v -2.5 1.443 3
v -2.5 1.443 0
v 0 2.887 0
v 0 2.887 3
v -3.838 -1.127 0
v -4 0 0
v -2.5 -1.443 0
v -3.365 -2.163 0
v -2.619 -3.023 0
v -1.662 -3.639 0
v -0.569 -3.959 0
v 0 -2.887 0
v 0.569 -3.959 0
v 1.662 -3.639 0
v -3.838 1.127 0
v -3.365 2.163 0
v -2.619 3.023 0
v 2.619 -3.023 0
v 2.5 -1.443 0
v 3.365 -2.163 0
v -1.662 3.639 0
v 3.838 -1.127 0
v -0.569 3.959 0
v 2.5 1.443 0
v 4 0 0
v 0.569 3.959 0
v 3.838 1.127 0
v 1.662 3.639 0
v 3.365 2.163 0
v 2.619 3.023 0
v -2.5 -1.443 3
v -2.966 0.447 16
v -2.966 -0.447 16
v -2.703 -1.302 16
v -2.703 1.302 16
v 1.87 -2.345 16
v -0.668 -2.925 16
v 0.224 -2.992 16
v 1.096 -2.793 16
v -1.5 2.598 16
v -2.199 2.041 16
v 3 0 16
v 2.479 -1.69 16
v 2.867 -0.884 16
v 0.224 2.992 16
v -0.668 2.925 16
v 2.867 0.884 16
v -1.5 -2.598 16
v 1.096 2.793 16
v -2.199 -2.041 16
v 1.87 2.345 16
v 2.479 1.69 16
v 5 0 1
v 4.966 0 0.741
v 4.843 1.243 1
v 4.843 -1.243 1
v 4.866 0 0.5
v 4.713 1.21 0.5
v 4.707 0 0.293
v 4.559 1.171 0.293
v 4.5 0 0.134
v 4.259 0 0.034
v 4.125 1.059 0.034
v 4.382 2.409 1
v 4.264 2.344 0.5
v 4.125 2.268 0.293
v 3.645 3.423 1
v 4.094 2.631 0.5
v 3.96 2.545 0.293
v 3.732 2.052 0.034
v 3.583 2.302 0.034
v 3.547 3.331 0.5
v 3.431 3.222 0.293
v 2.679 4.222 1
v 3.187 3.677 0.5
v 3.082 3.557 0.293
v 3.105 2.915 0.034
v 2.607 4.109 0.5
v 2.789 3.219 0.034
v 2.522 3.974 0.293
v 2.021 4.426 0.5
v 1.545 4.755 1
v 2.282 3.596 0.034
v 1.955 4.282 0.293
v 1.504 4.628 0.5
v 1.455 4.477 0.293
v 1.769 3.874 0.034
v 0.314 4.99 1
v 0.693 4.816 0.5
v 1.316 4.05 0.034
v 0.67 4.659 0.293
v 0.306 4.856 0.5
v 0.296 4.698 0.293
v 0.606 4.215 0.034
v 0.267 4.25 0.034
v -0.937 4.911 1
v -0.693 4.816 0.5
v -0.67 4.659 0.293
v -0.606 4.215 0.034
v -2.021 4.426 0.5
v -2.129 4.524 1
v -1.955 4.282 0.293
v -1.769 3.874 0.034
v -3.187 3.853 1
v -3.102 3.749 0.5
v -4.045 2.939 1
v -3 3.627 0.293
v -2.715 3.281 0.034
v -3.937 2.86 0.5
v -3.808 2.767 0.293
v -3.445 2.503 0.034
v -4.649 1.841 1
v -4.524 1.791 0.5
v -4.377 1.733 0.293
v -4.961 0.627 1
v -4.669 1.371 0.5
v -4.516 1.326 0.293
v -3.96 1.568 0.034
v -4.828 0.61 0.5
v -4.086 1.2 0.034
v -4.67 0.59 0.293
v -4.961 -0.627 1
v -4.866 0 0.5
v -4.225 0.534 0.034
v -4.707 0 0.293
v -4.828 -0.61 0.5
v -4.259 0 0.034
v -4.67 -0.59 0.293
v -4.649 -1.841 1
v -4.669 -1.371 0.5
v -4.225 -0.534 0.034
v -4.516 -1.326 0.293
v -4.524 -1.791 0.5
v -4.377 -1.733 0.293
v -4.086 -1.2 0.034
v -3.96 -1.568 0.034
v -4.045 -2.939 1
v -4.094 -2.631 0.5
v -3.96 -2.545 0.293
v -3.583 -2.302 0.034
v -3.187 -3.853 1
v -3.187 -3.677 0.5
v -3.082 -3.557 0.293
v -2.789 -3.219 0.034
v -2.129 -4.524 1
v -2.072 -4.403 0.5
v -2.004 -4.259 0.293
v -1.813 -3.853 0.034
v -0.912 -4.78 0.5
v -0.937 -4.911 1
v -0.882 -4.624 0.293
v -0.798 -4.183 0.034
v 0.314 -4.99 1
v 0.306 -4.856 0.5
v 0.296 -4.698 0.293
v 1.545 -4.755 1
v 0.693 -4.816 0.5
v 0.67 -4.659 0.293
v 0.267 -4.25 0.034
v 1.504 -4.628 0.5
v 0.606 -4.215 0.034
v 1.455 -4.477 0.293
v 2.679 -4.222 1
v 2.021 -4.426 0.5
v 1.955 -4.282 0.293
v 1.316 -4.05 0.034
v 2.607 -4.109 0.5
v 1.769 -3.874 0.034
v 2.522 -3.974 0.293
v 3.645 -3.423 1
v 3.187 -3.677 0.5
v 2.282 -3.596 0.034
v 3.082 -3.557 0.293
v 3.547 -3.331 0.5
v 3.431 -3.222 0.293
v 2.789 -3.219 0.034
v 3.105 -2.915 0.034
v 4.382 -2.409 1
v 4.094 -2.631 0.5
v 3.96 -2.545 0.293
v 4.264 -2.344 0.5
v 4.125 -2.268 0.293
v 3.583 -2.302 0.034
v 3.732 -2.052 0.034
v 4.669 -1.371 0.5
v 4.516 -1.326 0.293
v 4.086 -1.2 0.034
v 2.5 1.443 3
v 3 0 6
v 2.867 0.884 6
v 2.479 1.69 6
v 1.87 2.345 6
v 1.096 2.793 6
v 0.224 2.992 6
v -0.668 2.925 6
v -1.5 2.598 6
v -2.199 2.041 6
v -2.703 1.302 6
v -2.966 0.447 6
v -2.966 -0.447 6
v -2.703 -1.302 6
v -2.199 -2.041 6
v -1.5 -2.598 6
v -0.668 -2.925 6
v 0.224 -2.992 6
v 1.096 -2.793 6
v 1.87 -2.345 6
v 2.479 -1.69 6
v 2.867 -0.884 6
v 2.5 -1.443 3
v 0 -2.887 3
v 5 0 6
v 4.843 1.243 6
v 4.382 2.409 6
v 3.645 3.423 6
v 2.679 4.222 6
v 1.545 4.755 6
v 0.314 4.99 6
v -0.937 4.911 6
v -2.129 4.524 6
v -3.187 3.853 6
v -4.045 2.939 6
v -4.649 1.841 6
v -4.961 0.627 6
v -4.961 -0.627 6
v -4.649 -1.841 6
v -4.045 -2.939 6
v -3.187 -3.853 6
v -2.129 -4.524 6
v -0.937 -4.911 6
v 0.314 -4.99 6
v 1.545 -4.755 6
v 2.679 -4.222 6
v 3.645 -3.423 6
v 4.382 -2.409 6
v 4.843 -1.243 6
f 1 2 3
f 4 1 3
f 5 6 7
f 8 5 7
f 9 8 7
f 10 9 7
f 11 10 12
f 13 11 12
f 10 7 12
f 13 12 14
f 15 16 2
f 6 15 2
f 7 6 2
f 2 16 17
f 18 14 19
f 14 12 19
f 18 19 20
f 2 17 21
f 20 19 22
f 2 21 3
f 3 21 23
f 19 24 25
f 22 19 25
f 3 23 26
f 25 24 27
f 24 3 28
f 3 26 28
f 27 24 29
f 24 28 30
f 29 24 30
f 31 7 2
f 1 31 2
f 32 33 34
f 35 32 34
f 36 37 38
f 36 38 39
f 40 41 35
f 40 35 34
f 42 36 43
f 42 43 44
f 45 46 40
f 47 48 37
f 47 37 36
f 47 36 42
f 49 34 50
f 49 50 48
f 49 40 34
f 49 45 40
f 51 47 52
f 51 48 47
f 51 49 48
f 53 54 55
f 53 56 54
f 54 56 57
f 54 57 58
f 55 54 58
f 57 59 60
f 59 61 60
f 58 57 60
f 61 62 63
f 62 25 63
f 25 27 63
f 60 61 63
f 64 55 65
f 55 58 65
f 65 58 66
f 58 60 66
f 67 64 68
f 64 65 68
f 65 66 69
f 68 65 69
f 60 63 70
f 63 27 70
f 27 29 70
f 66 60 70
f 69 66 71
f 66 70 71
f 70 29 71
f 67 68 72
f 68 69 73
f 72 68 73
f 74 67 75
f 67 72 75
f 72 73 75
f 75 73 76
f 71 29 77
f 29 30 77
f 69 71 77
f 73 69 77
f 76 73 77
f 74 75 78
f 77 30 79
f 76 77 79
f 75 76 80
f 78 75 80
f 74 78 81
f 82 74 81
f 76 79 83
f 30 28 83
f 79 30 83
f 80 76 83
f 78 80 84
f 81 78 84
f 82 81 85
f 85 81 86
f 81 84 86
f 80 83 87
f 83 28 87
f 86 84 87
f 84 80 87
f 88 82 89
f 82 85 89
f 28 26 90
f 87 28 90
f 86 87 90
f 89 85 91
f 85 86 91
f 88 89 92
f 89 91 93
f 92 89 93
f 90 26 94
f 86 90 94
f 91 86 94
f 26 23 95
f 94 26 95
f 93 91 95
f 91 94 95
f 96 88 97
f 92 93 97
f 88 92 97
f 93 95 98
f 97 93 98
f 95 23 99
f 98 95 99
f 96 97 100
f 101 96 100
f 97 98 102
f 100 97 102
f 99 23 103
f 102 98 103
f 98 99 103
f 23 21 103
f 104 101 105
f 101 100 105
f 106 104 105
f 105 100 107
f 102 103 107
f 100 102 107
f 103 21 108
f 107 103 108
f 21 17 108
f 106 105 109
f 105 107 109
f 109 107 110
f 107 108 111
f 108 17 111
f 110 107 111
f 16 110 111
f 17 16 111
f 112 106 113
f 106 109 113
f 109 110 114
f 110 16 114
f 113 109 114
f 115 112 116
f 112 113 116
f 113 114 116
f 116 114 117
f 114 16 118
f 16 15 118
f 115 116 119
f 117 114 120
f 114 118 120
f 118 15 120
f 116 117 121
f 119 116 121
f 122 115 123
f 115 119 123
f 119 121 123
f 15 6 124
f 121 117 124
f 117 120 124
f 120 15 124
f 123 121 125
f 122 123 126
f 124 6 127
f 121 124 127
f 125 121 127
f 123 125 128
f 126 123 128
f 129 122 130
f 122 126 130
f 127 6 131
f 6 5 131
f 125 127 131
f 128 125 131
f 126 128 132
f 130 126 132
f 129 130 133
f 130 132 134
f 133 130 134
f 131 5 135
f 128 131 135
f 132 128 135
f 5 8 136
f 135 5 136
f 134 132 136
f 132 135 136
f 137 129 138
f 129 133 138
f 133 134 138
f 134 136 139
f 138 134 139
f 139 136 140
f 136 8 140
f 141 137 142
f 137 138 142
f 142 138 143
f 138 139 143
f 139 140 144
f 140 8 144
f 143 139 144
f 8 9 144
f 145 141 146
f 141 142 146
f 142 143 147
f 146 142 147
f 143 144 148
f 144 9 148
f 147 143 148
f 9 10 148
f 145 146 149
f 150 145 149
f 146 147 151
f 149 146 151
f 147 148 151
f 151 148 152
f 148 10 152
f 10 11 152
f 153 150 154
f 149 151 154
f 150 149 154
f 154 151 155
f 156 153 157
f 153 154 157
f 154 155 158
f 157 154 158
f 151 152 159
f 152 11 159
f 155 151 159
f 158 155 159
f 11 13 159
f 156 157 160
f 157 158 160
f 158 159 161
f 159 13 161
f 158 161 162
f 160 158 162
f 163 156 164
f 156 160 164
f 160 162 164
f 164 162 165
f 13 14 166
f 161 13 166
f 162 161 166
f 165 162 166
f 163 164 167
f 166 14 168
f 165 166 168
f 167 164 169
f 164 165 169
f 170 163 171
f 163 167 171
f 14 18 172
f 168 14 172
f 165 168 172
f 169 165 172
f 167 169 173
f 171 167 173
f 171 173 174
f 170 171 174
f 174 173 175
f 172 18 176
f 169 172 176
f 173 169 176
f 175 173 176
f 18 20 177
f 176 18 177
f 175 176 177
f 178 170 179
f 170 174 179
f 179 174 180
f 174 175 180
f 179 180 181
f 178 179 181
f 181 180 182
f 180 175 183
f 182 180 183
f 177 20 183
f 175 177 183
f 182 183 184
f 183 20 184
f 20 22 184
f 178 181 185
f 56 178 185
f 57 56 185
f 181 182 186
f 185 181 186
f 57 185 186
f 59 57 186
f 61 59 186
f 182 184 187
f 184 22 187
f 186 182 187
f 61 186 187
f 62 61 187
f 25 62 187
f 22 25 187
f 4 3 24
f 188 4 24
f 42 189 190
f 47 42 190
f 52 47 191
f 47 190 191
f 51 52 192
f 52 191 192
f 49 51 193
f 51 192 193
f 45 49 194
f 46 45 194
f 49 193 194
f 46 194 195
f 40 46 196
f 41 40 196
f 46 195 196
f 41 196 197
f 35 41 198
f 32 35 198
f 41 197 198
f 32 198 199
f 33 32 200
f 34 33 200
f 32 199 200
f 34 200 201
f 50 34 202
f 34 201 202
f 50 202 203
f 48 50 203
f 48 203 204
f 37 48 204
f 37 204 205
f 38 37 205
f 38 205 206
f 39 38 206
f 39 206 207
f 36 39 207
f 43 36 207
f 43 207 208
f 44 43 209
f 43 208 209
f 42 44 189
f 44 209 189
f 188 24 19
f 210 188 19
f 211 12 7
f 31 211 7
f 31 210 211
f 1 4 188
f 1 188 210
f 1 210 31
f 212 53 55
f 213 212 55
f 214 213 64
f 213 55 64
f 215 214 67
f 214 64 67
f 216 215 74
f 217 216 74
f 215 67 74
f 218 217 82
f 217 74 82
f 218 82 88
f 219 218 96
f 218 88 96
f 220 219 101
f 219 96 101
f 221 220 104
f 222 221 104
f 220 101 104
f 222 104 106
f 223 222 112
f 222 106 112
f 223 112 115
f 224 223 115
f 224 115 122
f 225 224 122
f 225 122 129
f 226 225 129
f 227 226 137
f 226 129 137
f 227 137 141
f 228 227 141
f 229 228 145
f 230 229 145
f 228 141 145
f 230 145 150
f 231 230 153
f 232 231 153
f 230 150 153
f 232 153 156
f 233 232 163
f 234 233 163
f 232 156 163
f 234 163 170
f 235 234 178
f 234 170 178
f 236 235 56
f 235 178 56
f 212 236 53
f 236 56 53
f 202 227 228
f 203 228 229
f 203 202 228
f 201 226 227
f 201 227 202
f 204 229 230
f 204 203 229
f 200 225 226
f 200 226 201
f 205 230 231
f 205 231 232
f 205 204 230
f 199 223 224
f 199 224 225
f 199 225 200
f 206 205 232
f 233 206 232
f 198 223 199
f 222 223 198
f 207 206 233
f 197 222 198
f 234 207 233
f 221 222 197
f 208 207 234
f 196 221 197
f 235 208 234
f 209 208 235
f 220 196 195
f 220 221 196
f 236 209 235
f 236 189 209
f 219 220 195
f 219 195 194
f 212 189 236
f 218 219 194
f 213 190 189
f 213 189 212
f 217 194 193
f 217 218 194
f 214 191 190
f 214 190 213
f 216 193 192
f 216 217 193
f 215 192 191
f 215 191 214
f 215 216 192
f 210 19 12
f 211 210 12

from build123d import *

# Parameters (mm, degrees)
SKETCH_1_R          = 5
EXTRUDE_1_DEPTH     = 6
SKETCH_2_R          = 3
EXTRUDE_2_DEPTH     = 10
CUT_EXTRUDE_1_DEPTH = 3
FILLET_1_R          = 1


with BuildPart() as part:
    # ｽｹｯﾁ1 → ﾎﾞｽ - 押し出し1 (new body)
    with BuildSketch(Plane.XY):
        Circle(SKETCH_1_R)
    extrude(amount=EXTRUDE_1_DEPTH)

    # ｽｹｯﾁ2 → ﾎﾞｽ - 押し出し2 (add)
    with BuildSketch(Plane.XY.offset(6)):
        Circle(SKETCH_2_R)
    extrude(amount=EXTRUDE_2_DEPTH)

    # ｽｹｯﾁ3 → ｶｯﾄ - 押し出し1 (cut)
    with BuildSketch(Plane(origin=(0, 0, 0), x_dir=(-1, 0, 0), z_dir=(0, 0, -1))):
        Polygon((-2.5, -1.443375673), (0, -2.886751346), (2.5, -1.443375673), (2.5, 1.443375673), (0, 2.886751346), (-2.5, 1.443375673), align=None)
    extrude(amount=-CUT_EXTRUDE_1_DEPTH, mode=Mode.SUBTRACT)

    # ﾌｨﾚｯﾄ1
    fillet_1_edges = [part.edges().sort_by_distance(p)[0] for p in [
        (-5, 0, 0),
    ]]
    fillet(fillet_1_edges, radius=FILLET_1_R)


solid = part.part
